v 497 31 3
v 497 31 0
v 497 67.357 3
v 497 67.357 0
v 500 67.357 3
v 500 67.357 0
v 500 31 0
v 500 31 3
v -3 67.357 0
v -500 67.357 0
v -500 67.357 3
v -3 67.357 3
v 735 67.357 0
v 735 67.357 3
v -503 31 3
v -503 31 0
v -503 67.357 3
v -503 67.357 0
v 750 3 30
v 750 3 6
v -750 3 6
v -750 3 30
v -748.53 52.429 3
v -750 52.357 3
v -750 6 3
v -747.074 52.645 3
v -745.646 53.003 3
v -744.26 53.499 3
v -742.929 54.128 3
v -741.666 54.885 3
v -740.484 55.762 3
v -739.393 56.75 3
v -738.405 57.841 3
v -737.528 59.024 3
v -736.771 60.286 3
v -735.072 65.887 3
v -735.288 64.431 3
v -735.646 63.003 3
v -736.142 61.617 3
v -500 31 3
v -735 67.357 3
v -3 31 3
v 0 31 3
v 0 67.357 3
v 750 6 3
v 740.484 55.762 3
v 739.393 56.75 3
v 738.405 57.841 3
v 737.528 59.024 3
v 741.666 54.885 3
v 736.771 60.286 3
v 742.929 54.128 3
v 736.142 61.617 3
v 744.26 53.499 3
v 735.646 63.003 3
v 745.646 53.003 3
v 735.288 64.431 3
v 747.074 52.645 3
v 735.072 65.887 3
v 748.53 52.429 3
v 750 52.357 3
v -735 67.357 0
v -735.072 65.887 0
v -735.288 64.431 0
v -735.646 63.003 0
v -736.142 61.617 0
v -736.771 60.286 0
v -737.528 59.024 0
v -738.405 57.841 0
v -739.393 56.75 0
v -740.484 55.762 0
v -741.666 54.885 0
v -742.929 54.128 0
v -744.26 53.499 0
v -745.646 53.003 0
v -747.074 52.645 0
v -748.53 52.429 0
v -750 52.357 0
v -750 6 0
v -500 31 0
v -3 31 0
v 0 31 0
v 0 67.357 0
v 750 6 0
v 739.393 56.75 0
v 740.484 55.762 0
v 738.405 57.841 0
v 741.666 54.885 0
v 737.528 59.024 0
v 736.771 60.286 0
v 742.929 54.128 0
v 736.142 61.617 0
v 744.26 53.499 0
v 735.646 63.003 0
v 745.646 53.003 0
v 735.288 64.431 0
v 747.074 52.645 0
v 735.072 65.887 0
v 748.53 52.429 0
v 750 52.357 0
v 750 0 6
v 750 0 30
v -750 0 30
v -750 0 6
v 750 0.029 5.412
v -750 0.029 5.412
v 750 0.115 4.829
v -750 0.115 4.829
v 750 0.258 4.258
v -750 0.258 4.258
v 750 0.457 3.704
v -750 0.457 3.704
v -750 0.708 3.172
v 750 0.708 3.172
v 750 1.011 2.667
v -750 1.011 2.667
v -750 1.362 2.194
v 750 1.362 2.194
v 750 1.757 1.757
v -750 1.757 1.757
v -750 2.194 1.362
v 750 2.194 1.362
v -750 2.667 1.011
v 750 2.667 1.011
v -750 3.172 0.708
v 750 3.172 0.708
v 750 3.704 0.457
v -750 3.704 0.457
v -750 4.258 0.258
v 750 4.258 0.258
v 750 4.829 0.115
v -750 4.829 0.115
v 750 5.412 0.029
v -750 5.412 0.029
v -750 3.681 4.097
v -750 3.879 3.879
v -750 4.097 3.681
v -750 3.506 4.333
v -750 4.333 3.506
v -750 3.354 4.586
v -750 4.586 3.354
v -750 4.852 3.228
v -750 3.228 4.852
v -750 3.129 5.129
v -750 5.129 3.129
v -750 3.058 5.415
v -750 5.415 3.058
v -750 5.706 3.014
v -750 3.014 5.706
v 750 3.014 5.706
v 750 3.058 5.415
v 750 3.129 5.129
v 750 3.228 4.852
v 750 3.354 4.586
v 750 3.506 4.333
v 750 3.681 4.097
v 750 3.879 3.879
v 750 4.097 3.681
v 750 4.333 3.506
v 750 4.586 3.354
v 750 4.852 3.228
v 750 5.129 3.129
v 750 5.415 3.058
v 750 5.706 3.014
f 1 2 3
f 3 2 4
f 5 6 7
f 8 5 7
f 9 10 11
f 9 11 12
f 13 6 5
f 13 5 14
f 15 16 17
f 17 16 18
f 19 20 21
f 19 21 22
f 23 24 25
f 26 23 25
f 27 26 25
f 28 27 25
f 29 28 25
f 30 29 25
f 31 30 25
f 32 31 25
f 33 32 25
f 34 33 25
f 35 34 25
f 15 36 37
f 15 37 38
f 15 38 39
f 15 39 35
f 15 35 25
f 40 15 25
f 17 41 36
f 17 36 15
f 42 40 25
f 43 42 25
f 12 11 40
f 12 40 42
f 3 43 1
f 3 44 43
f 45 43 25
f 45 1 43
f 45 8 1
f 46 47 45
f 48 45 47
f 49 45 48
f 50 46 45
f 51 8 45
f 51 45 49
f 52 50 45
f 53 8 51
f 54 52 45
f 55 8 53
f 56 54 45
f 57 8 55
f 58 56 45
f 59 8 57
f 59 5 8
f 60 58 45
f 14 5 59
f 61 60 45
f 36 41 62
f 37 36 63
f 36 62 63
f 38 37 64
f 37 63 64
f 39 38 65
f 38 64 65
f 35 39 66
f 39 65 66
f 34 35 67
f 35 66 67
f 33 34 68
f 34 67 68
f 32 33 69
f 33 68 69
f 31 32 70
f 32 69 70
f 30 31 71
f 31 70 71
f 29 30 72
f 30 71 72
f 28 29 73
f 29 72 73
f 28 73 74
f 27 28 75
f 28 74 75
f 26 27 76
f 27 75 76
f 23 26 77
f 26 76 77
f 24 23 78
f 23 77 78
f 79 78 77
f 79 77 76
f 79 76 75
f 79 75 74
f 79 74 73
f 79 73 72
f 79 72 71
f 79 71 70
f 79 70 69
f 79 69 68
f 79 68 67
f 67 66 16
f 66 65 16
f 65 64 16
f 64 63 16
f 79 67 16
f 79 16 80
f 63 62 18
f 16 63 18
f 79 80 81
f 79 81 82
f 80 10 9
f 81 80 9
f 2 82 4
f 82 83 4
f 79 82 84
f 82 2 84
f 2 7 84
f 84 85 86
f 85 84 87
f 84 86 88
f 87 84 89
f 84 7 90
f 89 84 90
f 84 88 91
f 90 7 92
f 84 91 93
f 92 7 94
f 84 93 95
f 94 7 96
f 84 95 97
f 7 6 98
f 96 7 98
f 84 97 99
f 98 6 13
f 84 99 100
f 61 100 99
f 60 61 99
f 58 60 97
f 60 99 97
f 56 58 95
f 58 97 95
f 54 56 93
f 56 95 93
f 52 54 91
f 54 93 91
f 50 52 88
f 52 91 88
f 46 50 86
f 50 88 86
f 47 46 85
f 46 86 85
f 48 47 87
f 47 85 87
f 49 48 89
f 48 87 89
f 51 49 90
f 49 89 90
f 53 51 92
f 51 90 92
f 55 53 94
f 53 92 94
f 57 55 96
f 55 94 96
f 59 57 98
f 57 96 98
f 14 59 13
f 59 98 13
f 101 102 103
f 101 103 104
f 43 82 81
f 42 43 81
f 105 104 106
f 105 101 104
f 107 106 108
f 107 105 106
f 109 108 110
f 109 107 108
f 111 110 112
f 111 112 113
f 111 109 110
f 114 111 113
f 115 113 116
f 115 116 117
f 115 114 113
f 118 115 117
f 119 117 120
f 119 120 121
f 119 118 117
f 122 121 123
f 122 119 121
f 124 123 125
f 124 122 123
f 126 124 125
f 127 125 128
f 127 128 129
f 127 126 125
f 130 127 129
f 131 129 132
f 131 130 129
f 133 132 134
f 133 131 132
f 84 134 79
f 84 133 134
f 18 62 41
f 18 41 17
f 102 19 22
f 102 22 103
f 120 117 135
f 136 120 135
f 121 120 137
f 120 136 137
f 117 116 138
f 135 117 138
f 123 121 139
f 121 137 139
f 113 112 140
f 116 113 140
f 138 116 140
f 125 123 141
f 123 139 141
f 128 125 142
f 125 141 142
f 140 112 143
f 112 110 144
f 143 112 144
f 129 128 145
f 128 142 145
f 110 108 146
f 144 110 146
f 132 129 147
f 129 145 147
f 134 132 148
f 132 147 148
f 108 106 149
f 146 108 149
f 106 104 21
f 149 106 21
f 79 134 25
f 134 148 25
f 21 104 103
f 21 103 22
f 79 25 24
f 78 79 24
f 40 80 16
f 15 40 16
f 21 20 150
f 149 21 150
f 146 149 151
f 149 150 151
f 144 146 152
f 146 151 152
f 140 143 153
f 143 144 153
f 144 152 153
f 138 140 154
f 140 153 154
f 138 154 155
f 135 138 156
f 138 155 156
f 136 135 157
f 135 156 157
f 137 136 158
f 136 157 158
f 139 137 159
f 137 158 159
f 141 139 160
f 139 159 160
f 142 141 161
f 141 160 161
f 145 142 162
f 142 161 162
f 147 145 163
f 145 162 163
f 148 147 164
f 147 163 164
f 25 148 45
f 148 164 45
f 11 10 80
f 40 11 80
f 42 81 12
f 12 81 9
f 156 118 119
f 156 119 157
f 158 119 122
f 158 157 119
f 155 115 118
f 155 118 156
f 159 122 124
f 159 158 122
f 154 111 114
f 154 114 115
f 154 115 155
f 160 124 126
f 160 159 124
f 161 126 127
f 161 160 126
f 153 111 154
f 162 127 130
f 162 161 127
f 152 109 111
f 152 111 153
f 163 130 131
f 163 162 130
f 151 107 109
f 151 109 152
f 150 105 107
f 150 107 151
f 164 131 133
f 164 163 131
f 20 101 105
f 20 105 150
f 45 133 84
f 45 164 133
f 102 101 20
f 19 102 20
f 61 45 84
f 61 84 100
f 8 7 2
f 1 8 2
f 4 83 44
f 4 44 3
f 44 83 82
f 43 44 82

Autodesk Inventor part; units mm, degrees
ref_plane "YZ Plane" through (0, 0, 0) normal (1, 0, 0) x (0, 1, 0)
ref_plane "XZ Plane" through (0, 0, 0) normal (0, 1, 0) x (-1, 0, 0)
ref_plane "XY Plane" through (0, 0, 0) normal (0, 0, 1) x (1, 0, 0)
sketch "Sketch1" plane through (0, 0, 0) normal (0, 0, 1) x (1, 0, 0)
  line L0 (-750, 67.3571) -> (750, 67.3571)
  line L1 (750, 67.3571) -> (750, 0)
  line L2 (750, 0) -> (-750, 0)
  line L3 (-750, 0) -> (-750, 67.3571)
  point P0 (0, 0)
  point P1 (0, 0)
  dimension "d0" = 1500
  dimension "d1" = 67.3571
extrude "Plate1" add sketch "Sketch1" along normal blind 3
sketch "Sketch2" plane through (750, 3, 0) normal (0, -1, 0) x (1, 0, 0)
  line L0 (-1500, 0) -> (0, 0)
  line L1 (0, 0) -> (0, 30)
  line L2 (0, 30) -> (-1500, 30)
  line L3 (-1500, 30) -> (-1500, 0)
edge flange "Flange1" height 30 angle 90 thickness 3 bend radius 3 thickness toward (0, -1, 0) relief tear relief width 3 relief depth 1.5 edges at (0, 0, 3) wall of the first edge with corners at (-750, 3, 0) (750, 3, 0) (750, 3, 30) (-750, 3, 30)
bend "Bend1"
corner "Corner1"
sketch "Sketch5" plane through (0, 0, 0) normal (0, 0, -1) x (-1, 0, 0)
  line L0 (750, 67.3571) -> (-750, 67.3571) projected
  line L1 (500, 67.3571) -> (500, 31)
  line L2 (500, 31) -> (503, 31)
  line L3 (503, 31) -> (503, 67.3571)
  line L4 (750, 0) -> (-750, 0) projected
  point P0 (0, 0)
  dimension "d18" = 3
  dimension "d19" = 247
  dimension "d20" = 31
extrude "Extrusion1" cut sketch "Sketch5" against normal through all
pattern_linear "Rectangular Pattern1" count 3 spacing 500 along (1, 0, 0) of "Extrusion1"
sketch "Sketch6" plane through (0, 0, 0) normal (0, 0, -1) x (-1, 0, 0)
  line L0 (-750, 67.3571) -> (-750, 6) projected
  circle A0 centre (-750, 67.3571) radius 15
  line L1 (-750, 67.3571) -> (750, 67.3571) projected
  point P0 (0, 0)
  point P1 (-500, 67.3571)
  point P2 (-735, 67.3571)
  point P3 (-750, 52.3571)
  dimension "d24" = 30
extrude "Extrusion2" cut sketch "Sketch6" against normal through all contours L1 A0 L0 picked at (-740.1254, 66.2445)
mirror "Mirror1" about plane through (0, 0, 0) normal (1, 0, 0) of "Extrusion2"
equation "\"d1\" = Стрингер_3"
equation "\"d18\" = Thickness"
equation "\"d2\" = Thickness"
equation "\"d3\" = BendReliefWidth"
equation "\"d4\" = BendReliefDepth"
equation "\"d5\" = MinimumRemnant"
equation "\"d6\" = TransitionRadius"
equation "\"d9\" = BendRadius"
equation "\"d10\" = CornerReliefSize"
equation "\"d11\" = GapSize"
equation "\"d12\" = JacobiRadiusSize"
equation "\"BendRadius\" = Thickness"
equation "\"BendReliefWidth\" = Thickness"
equation "\"BendReliefDepth\" = 0.5 * Thickness"
equation "\"CornerReliefSize\" = 4 * Thickness"
equation "\"MinimumRemnant\" = 2 * Thickness"
equation "\"TransitionRadius\" = BendRadius"
equation "\"JacobiRadiusSize\" = BendRadius"
equation "\"GapSize\" = Thickness"
equation "\"Стрингер_3\" = 67.357059"
equation "\"Thickness\" = 3"
properties part number "МОО 053 стрингер борт 31"
